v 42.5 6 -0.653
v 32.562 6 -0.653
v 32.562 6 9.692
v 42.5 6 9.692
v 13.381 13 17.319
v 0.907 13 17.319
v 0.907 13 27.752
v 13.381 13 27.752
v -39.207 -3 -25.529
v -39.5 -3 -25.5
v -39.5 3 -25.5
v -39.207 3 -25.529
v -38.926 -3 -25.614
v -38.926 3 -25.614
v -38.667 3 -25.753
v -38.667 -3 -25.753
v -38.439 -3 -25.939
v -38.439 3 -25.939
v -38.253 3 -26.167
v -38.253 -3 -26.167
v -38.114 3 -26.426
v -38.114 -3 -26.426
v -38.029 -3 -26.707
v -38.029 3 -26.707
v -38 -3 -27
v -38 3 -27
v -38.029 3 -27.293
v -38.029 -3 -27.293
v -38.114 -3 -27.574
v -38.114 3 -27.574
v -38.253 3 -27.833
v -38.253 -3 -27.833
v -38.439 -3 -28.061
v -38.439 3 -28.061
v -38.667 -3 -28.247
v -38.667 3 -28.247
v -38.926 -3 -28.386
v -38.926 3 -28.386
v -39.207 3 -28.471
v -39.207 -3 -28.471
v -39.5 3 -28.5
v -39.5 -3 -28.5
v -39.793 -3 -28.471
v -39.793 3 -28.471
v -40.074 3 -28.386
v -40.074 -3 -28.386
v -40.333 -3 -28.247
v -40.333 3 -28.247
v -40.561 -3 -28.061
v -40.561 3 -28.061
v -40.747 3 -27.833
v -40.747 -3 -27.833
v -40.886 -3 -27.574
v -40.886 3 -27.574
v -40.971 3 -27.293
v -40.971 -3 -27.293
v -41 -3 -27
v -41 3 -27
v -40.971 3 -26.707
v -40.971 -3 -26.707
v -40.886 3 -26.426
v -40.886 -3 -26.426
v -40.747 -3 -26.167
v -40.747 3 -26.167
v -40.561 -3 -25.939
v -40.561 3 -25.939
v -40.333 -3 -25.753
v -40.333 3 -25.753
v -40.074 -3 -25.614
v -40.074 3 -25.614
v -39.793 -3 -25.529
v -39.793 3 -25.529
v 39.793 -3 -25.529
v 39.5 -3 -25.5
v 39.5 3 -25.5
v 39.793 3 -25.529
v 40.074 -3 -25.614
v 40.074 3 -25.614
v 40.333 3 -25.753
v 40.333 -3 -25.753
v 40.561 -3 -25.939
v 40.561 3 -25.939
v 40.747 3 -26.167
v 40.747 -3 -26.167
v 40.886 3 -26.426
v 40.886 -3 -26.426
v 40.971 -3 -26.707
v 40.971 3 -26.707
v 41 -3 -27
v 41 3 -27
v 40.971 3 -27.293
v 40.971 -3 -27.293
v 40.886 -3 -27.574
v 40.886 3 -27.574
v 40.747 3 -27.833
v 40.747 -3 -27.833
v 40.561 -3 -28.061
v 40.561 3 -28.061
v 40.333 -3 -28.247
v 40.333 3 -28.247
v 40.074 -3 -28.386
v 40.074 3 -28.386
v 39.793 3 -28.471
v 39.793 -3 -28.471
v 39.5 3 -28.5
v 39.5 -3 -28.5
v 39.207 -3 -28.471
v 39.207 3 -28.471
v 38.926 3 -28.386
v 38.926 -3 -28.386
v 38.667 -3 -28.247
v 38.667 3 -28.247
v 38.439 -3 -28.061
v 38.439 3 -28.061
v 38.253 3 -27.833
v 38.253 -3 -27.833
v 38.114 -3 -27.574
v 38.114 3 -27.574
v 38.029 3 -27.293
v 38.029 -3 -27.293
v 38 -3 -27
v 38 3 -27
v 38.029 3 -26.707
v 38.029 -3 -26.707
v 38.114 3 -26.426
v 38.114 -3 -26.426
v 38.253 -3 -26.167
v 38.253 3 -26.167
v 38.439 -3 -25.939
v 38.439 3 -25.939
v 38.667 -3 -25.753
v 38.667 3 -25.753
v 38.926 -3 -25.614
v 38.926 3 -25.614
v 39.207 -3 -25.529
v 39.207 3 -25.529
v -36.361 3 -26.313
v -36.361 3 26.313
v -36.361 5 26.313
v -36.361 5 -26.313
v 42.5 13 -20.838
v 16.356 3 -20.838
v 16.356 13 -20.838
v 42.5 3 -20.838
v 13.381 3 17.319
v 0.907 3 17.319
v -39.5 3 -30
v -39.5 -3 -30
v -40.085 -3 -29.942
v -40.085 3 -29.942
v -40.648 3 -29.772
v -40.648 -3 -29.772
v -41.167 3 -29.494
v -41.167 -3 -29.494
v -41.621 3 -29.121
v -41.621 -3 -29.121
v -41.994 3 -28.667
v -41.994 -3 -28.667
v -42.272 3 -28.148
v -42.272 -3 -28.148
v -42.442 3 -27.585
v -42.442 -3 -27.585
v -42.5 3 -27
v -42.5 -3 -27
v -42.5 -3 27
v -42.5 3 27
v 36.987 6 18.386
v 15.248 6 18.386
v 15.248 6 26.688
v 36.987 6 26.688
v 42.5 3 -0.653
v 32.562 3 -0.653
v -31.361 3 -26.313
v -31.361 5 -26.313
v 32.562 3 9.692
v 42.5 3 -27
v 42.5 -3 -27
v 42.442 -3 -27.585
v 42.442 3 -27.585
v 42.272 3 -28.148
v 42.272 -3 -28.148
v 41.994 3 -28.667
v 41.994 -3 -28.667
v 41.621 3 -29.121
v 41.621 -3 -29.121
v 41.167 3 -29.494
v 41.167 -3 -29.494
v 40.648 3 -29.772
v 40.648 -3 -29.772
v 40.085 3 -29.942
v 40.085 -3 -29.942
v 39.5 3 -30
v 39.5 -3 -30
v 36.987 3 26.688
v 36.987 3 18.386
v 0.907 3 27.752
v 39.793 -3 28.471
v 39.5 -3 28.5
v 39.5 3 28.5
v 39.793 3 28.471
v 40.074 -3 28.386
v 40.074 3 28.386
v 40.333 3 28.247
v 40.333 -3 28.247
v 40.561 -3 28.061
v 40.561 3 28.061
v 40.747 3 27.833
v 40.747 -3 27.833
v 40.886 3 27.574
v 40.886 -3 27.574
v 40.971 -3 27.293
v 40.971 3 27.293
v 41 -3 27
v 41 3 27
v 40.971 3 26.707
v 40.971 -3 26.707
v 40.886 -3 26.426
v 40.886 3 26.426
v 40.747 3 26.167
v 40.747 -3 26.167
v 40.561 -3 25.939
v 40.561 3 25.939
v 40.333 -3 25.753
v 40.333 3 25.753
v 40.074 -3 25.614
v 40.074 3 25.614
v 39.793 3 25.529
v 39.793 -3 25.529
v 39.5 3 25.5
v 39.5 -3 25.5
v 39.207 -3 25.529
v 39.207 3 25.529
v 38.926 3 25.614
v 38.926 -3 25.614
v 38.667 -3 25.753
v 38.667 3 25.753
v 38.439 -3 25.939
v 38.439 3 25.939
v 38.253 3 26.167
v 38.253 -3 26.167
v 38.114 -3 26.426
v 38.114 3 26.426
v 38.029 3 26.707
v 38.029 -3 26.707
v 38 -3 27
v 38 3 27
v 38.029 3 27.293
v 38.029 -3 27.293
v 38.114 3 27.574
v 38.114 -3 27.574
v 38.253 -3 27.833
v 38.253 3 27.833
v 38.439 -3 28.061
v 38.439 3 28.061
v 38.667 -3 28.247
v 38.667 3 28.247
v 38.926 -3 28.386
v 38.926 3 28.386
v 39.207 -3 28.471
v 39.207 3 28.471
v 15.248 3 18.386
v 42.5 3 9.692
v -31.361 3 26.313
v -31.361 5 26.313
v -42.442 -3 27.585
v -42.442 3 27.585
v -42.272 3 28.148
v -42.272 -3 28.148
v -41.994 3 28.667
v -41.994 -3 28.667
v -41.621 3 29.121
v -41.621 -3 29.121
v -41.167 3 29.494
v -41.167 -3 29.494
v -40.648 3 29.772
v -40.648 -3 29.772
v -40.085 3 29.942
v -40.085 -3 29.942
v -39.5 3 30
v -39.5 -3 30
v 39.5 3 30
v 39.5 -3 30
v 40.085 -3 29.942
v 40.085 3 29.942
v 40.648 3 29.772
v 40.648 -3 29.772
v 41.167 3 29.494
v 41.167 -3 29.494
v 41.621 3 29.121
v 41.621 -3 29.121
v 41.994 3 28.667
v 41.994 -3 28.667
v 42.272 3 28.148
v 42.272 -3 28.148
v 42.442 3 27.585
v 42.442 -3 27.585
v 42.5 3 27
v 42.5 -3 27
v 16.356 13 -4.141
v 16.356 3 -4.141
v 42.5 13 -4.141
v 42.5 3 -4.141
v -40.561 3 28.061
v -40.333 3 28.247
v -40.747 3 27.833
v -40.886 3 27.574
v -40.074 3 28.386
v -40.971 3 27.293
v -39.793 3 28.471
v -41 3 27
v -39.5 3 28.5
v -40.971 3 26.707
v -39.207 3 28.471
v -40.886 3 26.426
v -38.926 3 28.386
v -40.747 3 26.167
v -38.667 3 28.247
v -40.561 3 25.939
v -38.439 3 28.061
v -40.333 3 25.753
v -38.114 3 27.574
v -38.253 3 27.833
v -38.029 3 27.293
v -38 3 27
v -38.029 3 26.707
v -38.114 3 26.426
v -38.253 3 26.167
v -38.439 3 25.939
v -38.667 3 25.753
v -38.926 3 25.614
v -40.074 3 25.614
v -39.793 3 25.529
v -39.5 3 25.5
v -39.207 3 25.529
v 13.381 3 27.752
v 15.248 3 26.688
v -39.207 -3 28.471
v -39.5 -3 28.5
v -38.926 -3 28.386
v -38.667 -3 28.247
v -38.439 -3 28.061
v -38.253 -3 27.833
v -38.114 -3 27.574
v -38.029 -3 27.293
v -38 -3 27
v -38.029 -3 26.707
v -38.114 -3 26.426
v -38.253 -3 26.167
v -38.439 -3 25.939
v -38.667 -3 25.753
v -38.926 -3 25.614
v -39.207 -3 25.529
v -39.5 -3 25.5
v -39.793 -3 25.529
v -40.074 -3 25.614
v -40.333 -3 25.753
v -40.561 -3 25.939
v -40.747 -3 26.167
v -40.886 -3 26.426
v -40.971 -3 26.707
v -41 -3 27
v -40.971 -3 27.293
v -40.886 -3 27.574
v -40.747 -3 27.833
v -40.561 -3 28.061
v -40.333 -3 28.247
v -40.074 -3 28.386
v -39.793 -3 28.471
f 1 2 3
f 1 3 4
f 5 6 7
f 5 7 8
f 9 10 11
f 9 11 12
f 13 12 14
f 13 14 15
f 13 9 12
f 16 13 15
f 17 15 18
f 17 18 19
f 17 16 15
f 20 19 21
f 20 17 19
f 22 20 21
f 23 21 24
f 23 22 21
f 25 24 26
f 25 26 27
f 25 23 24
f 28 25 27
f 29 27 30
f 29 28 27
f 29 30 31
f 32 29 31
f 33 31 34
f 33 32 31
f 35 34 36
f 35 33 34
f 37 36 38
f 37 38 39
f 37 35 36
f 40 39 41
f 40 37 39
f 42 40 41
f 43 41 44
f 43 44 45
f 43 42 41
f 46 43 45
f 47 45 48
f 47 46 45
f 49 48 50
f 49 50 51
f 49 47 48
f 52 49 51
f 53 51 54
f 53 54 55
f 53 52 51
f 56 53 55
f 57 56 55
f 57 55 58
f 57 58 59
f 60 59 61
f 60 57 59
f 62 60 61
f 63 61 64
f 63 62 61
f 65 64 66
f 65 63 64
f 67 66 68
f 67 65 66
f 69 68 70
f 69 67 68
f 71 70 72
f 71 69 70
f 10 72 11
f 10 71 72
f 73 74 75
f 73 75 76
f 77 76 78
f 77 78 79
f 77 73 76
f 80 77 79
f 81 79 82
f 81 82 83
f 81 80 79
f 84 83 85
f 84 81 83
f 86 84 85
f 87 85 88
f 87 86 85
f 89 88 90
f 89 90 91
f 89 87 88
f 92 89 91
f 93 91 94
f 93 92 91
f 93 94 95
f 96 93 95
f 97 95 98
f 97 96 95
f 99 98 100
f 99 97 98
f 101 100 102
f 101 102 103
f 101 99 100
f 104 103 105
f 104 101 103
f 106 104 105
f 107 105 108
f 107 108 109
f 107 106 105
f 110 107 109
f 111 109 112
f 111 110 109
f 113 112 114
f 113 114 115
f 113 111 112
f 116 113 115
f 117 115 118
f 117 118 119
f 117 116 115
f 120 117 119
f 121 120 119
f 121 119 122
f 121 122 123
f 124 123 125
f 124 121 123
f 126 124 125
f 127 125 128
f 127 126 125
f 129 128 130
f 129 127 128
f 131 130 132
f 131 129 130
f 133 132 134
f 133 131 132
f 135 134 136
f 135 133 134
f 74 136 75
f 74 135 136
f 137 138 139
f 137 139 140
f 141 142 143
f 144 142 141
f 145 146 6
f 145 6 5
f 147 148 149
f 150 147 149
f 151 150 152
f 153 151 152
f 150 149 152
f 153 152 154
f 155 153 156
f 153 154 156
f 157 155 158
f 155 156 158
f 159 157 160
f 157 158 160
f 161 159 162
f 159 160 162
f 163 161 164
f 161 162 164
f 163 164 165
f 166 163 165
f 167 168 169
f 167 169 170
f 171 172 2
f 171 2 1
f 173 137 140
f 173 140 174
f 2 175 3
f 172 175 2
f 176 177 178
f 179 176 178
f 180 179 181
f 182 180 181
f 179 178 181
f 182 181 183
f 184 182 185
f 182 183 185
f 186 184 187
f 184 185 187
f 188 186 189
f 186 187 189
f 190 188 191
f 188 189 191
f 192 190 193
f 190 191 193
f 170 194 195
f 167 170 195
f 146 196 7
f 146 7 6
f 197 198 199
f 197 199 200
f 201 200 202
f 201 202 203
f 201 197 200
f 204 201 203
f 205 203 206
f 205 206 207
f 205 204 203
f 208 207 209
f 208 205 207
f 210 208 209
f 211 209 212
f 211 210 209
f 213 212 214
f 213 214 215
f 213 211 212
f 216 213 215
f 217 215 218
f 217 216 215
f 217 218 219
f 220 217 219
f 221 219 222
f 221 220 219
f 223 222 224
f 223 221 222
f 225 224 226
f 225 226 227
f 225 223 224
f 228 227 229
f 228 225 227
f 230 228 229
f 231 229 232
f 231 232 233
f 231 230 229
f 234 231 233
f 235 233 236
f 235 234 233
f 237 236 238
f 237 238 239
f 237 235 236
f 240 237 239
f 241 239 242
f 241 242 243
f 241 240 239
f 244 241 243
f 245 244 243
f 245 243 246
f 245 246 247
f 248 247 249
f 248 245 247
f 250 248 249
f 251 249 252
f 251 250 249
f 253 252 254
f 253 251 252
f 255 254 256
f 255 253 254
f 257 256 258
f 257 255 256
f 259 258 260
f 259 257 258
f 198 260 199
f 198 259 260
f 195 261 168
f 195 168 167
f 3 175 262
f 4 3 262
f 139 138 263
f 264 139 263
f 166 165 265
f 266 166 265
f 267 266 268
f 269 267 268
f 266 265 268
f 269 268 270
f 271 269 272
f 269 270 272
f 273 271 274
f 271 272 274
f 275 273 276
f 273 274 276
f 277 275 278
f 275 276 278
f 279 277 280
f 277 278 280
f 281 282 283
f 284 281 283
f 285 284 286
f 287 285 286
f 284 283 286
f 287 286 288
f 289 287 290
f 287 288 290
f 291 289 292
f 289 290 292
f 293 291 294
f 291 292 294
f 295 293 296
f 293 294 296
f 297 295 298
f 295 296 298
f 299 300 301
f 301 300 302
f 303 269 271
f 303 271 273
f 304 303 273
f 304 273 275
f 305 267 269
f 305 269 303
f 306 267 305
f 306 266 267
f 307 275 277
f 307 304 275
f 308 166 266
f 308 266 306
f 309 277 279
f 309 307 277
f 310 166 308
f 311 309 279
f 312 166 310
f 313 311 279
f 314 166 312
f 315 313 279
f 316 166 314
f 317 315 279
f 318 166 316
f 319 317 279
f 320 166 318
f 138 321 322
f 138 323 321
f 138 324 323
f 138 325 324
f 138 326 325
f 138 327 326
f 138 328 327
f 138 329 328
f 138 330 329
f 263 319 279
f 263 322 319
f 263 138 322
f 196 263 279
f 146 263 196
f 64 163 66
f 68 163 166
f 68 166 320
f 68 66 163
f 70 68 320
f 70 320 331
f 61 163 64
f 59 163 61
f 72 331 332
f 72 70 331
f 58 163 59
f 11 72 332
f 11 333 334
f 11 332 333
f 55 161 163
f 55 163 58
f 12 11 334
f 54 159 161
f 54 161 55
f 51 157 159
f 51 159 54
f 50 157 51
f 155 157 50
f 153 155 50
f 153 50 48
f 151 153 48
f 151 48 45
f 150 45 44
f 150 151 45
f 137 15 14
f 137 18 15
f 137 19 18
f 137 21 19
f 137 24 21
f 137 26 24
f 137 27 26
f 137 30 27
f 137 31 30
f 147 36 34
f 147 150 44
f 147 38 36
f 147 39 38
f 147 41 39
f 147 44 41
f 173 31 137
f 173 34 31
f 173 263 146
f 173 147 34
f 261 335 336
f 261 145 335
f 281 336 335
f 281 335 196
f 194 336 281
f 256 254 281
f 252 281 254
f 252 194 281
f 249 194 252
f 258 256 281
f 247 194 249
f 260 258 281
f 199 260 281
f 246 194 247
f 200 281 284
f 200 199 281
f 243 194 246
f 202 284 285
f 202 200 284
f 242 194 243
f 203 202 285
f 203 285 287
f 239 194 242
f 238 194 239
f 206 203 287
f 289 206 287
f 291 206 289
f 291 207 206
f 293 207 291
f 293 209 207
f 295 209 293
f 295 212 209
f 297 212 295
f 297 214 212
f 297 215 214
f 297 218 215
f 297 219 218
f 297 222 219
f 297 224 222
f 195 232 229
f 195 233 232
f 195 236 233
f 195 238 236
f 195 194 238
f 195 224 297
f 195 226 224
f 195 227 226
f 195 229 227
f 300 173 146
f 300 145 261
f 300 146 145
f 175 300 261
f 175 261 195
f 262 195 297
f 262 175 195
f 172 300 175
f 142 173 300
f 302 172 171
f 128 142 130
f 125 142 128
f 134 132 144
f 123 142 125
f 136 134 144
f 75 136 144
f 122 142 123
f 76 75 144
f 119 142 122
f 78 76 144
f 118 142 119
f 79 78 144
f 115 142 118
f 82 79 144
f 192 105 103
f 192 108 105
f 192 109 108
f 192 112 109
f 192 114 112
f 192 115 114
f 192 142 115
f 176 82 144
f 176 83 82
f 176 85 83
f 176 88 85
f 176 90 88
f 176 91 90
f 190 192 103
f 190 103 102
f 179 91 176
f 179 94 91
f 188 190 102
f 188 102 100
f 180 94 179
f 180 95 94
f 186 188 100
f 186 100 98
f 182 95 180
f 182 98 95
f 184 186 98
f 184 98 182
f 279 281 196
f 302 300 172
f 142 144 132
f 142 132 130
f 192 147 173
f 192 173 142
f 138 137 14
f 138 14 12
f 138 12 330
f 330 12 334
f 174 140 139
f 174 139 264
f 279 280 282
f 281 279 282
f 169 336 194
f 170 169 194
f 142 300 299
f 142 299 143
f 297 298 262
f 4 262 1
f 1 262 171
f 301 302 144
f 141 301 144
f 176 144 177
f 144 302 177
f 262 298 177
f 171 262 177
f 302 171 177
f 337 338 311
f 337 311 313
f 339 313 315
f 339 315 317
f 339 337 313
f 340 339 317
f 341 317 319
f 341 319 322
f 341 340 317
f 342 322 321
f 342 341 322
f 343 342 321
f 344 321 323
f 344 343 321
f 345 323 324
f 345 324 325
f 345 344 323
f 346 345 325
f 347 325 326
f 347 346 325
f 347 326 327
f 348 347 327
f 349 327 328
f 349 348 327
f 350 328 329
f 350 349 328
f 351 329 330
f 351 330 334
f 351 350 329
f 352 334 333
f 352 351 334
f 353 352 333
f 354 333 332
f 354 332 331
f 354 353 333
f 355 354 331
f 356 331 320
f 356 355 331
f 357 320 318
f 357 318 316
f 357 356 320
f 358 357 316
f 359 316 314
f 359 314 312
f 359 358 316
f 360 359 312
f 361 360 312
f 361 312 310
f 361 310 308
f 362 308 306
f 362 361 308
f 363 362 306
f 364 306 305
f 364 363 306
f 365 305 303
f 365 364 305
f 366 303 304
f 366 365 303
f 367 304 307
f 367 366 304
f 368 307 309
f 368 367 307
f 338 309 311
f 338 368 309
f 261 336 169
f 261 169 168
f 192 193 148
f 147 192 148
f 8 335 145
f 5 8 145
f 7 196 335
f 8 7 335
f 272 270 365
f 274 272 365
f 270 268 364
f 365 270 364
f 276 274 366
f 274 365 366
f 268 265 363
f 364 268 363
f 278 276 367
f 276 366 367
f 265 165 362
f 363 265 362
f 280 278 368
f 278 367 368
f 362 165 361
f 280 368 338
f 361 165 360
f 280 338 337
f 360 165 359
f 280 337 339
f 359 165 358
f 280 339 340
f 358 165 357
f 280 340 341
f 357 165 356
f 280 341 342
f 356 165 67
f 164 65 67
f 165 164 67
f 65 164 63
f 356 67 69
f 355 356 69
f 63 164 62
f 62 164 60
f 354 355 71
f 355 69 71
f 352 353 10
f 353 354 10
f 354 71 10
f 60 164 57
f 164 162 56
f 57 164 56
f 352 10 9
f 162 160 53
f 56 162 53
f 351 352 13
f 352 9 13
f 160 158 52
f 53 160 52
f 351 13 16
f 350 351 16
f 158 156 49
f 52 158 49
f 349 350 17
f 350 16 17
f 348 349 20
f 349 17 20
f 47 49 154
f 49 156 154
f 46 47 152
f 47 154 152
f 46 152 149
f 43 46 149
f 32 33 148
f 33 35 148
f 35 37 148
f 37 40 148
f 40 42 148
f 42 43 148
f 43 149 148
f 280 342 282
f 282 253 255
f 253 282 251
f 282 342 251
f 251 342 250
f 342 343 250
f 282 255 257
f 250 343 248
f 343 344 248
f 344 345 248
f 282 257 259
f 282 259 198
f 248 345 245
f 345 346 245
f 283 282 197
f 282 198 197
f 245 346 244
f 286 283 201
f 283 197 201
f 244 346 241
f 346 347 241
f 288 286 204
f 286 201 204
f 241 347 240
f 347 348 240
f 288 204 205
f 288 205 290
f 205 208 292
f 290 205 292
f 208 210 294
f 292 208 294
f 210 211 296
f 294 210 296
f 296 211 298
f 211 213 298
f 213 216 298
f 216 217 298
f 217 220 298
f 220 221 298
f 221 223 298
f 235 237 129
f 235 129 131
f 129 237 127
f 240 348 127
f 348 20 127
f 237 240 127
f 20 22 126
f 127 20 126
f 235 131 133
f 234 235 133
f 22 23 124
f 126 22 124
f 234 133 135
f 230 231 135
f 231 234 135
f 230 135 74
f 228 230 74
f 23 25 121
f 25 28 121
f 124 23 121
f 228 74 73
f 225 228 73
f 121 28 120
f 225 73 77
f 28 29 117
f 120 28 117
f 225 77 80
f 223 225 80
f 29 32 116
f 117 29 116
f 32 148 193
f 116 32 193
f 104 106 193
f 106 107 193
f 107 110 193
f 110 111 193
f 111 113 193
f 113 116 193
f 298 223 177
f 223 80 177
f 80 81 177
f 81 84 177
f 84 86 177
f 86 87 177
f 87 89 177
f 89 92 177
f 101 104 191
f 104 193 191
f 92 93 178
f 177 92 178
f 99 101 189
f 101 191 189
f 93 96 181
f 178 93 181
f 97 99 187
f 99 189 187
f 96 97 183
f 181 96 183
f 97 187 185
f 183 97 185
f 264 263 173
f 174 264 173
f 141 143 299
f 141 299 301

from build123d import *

# Parameters (mm, degrees)
BOSS_EXTRUDE1_DEPTH      = 3
BOSS_EXTRUDE1_DEPTH_BACK = 3
SKETCH1_R                = 1.5
SKETCH2_W                = 5
SKETCH2_H                = 52.625164332
BOSS_EXTRUDE2_DEPTH      = 5
SKETCH3_W                = 26.14370814
SKETCH3_H                = 16.696493178
BOSS_EXTRUDE3_DEPTH      = 13
SKETCH4_W                = 9.938286277
SKETCH4_H                = 10.344826846
BOSS_EXTRUDE4_DEPTH      = 6
SKETCH5_W                = 12.473423639
SKETCH5_H                = 10.432804083
BOSS_EXTRUDE5_DEPTH      = 13
SKETCH6_W                = 21.73915334
SKETCH6_H                = 8.30143682
BOSS_EXTRUDE6_DEPTH      = 6


with BuildPart() as part:
    # Sketch1 → Boss-Extrude1 (new, two sides: drawn at the far end of the back side and taken through both)
    with BuildSketch(Plane(origin=(0, 0, 0), x_dir=(1, 0, 0), z_dir=(0, 1, 0)).offset(-BOSS_EXTRUDE1_DEPTH_BACK)):
        with BuildLine():
            Line((-39.5, -30), (39.5, -30))
            ThreePointArc((39.5, -30), (41.621320344, -29.121320344), (42.5, -27))
            Line((42.5, -27), (42.5, 27))
            ThreePointArc((42.5, 27), (41.621320344, 29.121320344), (39.5, 30))
            Line((39.5, 30), (-39.5, 30))
            ThreePointArc((-39.5, 30), (-41.621320344, 29.121320344), (-42.5, 27))
            Line((-42.5, 27), (-42.5, -27))
            ThreePointArc((-42.5, -27), (-41.621320344, -29.121320344), (-39.5, -30))
        make_face()
        with Locations((-39.5, 27)):
            Circle(SKETCH1_R, mode=Mode.SUBTRACT)
        with Locations((39.5, 27)):
            Circle(SKETCH1_R, mode=Mode.SUBTRACT)
        with Locations((39.5, -27)):
            Circle(SKETCH1_R, mode=Mode.SUBTRACT)
        with Locations((-39.5, -27)):
            Circle(SKETCH1_R, mode=Mode.SUBTRACT)
    extrude(amount=BOSS_EXTRUDE1_DEPTH + BOSS_EXTRUDE1_DEPTH_BACK)

    # Sketch2 → Boss-Extrude2 (add)
    with BuildSketch(Plane(origin=(0, 0, 0), x_dir=(1, 0, 0), z_dir=(0, 1, 0))):
        with Locations((-33.860518443, 0)):
            Rectangle(SKETCH2_W, SKETCH2_H)
    extrude(amount=BOSS_EXTRUDE2_DEPTH)

    # Sketch3 → Boss-Extrude3 (add)
    with BuildSketch(Plane(origin=(0, 0, 0), x_dir=(1, 0, 0), z_dir=(0, 1, 0))):
        with Locations((29.42814593, 12.489663364)):
            Rectangle(SKETCH3_W, SKETCH3_H)
    extrude(amount=BOSS_EXTRUDE3_DEPTH)

    # Sketch4 → Boss-Extrude4 (add)
    with BuildSketch(Plane(origin=(0, 0, 0), x_dir=(1, 0, 0), z_dir=(0, 1, 0))):
        with Locations((37.530856861, -4.519547668)):
            Rectangle(SKETCH4_W, SKETCH4_H)
    extrude(amount=BOSS_EXTRUDE4_DEPTH)

    # Sketch5 → Boss-Extrude5 (add)
    with BuildSketch(Plane(origin=(0, 0, 0), x_dir=(1, 0, 0), z_dir=(0, 1, 0))):
        with Locations((7.14417266, -22.535803866)):
            Rectangle(SKETCH5_W, SKETCH5_H)
    extrude(amount=BOSS_EXTRUDE5_DEPTH)

    # Sketch6 → Boss-Extrude6 (add)
    with BuildSketch(Plane(origin=(0, 0, 0), x_dir=(1, 0, 0), z_dir=(0, 1, 0))):
        with Locations((26.117763778, -22.537195349)):
            Rectangle(SKETCH6_W, SKETCH6_H)
    extrude(amount=BOSS_EXTRUDE6_DEPTH)


solid = part.part
